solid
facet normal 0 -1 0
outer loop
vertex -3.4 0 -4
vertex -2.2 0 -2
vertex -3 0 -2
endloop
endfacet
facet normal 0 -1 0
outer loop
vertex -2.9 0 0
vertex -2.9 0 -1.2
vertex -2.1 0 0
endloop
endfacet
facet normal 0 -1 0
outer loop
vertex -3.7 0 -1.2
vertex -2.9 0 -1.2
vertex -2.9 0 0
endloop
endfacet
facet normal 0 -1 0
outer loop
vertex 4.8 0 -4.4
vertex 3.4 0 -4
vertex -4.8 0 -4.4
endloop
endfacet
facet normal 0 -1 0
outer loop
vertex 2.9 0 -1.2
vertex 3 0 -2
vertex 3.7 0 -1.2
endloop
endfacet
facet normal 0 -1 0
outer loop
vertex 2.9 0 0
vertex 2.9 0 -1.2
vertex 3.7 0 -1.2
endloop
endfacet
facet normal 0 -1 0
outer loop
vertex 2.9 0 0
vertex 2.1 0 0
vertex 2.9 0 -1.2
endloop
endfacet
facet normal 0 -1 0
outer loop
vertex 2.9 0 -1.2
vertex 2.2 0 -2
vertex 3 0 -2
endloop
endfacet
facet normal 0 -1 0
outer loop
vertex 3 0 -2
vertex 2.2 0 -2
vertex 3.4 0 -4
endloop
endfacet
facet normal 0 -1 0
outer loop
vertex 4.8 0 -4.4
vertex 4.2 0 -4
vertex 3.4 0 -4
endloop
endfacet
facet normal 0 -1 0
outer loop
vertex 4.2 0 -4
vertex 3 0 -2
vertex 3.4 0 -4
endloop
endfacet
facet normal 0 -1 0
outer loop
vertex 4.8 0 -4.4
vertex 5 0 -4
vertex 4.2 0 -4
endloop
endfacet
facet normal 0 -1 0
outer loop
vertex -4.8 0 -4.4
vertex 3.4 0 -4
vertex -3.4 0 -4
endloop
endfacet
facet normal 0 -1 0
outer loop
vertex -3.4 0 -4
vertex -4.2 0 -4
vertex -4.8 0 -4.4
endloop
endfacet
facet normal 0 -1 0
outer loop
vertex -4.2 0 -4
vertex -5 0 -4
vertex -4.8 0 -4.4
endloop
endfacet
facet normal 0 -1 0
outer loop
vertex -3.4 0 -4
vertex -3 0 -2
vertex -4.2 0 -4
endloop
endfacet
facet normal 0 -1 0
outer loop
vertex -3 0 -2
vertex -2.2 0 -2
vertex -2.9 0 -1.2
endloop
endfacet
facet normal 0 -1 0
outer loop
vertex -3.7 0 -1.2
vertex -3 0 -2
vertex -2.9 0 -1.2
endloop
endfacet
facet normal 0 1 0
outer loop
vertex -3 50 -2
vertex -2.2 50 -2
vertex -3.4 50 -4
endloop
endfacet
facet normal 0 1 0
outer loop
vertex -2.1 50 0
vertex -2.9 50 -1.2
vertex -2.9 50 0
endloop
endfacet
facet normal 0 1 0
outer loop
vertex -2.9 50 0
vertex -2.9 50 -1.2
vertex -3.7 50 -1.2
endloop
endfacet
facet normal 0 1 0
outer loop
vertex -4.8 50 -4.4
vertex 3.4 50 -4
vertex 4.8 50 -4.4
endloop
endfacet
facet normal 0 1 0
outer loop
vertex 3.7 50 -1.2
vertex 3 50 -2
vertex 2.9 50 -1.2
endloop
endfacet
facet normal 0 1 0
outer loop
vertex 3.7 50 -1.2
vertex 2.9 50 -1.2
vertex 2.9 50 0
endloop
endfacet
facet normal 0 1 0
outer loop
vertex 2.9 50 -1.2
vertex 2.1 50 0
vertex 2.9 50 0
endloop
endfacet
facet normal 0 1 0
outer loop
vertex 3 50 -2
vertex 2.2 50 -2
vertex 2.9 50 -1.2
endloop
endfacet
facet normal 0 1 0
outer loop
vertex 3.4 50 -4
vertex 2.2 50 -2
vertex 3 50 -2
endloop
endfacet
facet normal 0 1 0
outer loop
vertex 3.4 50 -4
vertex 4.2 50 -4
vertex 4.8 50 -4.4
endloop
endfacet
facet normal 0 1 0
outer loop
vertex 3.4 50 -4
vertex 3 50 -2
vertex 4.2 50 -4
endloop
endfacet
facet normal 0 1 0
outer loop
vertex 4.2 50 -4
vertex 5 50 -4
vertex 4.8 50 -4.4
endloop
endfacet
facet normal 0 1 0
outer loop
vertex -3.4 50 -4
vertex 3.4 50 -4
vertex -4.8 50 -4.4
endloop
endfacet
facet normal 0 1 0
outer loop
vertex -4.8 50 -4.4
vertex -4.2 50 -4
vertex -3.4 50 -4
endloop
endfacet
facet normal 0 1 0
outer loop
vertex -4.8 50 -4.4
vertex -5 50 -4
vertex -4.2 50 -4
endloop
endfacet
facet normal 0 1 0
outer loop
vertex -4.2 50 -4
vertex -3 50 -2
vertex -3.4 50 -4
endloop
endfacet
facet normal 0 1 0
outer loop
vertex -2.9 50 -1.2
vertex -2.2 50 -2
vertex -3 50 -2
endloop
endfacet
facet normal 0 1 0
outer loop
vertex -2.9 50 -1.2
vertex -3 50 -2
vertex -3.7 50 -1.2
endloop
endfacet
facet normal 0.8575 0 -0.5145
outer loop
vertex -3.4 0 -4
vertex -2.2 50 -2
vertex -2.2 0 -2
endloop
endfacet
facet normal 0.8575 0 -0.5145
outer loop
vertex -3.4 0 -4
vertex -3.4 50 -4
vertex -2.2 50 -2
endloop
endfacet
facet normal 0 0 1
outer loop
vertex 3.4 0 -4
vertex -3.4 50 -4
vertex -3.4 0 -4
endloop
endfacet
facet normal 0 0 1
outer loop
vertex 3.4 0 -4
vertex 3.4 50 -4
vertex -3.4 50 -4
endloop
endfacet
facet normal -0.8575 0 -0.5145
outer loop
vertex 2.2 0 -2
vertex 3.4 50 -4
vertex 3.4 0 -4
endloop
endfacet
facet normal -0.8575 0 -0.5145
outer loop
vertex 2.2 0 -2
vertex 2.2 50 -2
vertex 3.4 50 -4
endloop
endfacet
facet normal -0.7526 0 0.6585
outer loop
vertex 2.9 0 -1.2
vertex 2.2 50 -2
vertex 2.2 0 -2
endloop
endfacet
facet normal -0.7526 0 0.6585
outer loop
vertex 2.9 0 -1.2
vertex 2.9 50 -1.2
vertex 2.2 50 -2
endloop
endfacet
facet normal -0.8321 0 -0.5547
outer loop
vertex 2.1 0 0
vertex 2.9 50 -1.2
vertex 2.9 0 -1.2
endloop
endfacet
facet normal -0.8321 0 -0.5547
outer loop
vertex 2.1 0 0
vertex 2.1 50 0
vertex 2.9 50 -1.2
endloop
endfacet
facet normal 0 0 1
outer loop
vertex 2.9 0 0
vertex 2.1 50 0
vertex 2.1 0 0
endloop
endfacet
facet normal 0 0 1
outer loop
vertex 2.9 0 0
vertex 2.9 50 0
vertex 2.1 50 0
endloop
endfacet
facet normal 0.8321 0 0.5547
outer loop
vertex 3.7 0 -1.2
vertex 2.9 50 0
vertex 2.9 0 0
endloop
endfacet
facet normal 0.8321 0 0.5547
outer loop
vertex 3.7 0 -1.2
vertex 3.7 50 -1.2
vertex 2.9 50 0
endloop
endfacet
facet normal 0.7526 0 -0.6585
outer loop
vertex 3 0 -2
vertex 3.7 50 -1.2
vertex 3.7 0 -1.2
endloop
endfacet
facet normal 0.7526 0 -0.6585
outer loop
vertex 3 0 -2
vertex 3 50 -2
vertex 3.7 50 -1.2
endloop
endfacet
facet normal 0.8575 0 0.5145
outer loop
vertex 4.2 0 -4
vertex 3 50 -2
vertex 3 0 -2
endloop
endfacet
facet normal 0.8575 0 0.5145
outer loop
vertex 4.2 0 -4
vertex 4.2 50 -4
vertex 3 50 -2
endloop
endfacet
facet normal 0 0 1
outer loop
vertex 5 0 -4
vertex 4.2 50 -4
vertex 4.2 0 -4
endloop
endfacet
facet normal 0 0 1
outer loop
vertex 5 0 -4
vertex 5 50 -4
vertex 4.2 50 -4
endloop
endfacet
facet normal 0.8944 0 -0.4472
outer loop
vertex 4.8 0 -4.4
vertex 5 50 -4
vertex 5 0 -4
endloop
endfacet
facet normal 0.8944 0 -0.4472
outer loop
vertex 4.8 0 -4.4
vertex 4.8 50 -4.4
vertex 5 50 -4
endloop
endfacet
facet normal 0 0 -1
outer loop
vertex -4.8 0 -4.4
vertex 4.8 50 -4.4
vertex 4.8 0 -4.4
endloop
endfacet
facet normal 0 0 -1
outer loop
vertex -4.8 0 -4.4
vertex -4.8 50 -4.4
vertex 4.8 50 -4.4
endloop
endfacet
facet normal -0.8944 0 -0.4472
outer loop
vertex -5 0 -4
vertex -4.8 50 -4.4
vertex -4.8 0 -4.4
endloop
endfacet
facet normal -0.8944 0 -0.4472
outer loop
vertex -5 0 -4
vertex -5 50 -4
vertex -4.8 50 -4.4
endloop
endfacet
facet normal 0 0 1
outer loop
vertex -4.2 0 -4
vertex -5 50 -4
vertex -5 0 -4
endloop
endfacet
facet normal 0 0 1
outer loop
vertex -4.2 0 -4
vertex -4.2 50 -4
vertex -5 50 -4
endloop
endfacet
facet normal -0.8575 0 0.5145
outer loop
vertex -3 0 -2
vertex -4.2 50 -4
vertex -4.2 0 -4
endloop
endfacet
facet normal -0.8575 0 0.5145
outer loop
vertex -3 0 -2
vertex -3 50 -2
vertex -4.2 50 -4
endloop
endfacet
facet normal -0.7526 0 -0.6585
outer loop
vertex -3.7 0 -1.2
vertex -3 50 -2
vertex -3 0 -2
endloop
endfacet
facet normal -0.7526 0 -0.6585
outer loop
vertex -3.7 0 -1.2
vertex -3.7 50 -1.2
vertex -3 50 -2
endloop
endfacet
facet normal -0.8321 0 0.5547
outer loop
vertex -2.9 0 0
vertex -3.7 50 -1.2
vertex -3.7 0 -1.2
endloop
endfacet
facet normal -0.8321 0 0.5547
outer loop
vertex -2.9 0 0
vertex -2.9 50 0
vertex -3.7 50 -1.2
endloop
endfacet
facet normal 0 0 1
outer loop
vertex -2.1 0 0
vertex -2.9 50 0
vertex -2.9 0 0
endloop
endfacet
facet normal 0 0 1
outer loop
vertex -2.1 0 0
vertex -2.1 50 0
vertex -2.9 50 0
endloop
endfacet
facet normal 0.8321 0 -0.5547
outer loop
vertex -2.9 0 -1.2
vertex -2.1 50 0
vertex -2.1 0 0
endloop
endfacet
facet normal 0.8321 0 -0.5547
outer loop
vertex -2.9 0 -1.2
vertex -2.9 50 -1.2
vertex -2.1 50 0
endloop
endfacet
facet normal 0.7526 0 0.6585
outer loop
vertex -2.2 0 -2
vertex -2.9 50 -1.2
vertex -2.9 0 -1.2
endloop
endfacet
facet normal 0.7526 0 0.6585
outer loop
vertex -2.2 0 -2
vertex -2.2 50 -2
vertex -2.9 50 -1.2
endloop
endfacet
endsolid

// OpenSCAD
length = 50; // [3:0.1:500]

// conver extension on one side
// leave it 0 (zero) if you don't need it
side_extension_width = 0; // [0:0.1:20]

/* HIDDEN */
side_add_w = side_extension_width;

$fn=1*60;

top2_w = 1*9.6;
top_w = 1*10; // 9.2 -v2> 9.6 -v3> 10
w1 = 1*8.4;
w2 = 1*6;
w3 = 1*7.4; // 8 -v2> 7.4
bottom_w = 1*5.8;

h1 = 1*4; // 3.8 -v4> 4.0
h2 = 1*2;
h3 = 1*1.2;
h_top_cover = 1*0.4;

wall_thick = 1*0.8; // 
tb_thick = 1*0; // top-bottom thickness 0.8 -v3> 0.4 -v4> 0

// MAIN

rotate([-90,0,0])
linear_extrude(height = length) {
	difference() {
		polygon(points=[[-bottom_w/2, 0],
						[-w3/2, h3],
						[-w2/2, h2],
						[-w1/2, h1],
						[-top_w/2, h1],
						[-top2_w/2, h1 + h_top_cover],
						[top2_w/2 + side_add_w, h1 + h_top_cover],
						[top_w/2 + side_add_w, h1],
						[w1/2, h1],
						[w2/2, h2],
						[w3/2, h3],
						[bottom_w/2, 0]]);

		polygon(points=[[-bottom_w/2 + wall_thick, tb_thick],
						[-w3/2 + wall_thick, h3],
						[-w2/2 + wall_thick, h2],
						[-w1/2 + wall_thick, h1],
						[w1/2 - wall_thick, h1],
						[w2/2 - wall_thick, h2],
						[w3/2 - wall_thick, h3],
						[bottom_w/2 - wall_thick, tb_thick]]);
	}			
		
}
